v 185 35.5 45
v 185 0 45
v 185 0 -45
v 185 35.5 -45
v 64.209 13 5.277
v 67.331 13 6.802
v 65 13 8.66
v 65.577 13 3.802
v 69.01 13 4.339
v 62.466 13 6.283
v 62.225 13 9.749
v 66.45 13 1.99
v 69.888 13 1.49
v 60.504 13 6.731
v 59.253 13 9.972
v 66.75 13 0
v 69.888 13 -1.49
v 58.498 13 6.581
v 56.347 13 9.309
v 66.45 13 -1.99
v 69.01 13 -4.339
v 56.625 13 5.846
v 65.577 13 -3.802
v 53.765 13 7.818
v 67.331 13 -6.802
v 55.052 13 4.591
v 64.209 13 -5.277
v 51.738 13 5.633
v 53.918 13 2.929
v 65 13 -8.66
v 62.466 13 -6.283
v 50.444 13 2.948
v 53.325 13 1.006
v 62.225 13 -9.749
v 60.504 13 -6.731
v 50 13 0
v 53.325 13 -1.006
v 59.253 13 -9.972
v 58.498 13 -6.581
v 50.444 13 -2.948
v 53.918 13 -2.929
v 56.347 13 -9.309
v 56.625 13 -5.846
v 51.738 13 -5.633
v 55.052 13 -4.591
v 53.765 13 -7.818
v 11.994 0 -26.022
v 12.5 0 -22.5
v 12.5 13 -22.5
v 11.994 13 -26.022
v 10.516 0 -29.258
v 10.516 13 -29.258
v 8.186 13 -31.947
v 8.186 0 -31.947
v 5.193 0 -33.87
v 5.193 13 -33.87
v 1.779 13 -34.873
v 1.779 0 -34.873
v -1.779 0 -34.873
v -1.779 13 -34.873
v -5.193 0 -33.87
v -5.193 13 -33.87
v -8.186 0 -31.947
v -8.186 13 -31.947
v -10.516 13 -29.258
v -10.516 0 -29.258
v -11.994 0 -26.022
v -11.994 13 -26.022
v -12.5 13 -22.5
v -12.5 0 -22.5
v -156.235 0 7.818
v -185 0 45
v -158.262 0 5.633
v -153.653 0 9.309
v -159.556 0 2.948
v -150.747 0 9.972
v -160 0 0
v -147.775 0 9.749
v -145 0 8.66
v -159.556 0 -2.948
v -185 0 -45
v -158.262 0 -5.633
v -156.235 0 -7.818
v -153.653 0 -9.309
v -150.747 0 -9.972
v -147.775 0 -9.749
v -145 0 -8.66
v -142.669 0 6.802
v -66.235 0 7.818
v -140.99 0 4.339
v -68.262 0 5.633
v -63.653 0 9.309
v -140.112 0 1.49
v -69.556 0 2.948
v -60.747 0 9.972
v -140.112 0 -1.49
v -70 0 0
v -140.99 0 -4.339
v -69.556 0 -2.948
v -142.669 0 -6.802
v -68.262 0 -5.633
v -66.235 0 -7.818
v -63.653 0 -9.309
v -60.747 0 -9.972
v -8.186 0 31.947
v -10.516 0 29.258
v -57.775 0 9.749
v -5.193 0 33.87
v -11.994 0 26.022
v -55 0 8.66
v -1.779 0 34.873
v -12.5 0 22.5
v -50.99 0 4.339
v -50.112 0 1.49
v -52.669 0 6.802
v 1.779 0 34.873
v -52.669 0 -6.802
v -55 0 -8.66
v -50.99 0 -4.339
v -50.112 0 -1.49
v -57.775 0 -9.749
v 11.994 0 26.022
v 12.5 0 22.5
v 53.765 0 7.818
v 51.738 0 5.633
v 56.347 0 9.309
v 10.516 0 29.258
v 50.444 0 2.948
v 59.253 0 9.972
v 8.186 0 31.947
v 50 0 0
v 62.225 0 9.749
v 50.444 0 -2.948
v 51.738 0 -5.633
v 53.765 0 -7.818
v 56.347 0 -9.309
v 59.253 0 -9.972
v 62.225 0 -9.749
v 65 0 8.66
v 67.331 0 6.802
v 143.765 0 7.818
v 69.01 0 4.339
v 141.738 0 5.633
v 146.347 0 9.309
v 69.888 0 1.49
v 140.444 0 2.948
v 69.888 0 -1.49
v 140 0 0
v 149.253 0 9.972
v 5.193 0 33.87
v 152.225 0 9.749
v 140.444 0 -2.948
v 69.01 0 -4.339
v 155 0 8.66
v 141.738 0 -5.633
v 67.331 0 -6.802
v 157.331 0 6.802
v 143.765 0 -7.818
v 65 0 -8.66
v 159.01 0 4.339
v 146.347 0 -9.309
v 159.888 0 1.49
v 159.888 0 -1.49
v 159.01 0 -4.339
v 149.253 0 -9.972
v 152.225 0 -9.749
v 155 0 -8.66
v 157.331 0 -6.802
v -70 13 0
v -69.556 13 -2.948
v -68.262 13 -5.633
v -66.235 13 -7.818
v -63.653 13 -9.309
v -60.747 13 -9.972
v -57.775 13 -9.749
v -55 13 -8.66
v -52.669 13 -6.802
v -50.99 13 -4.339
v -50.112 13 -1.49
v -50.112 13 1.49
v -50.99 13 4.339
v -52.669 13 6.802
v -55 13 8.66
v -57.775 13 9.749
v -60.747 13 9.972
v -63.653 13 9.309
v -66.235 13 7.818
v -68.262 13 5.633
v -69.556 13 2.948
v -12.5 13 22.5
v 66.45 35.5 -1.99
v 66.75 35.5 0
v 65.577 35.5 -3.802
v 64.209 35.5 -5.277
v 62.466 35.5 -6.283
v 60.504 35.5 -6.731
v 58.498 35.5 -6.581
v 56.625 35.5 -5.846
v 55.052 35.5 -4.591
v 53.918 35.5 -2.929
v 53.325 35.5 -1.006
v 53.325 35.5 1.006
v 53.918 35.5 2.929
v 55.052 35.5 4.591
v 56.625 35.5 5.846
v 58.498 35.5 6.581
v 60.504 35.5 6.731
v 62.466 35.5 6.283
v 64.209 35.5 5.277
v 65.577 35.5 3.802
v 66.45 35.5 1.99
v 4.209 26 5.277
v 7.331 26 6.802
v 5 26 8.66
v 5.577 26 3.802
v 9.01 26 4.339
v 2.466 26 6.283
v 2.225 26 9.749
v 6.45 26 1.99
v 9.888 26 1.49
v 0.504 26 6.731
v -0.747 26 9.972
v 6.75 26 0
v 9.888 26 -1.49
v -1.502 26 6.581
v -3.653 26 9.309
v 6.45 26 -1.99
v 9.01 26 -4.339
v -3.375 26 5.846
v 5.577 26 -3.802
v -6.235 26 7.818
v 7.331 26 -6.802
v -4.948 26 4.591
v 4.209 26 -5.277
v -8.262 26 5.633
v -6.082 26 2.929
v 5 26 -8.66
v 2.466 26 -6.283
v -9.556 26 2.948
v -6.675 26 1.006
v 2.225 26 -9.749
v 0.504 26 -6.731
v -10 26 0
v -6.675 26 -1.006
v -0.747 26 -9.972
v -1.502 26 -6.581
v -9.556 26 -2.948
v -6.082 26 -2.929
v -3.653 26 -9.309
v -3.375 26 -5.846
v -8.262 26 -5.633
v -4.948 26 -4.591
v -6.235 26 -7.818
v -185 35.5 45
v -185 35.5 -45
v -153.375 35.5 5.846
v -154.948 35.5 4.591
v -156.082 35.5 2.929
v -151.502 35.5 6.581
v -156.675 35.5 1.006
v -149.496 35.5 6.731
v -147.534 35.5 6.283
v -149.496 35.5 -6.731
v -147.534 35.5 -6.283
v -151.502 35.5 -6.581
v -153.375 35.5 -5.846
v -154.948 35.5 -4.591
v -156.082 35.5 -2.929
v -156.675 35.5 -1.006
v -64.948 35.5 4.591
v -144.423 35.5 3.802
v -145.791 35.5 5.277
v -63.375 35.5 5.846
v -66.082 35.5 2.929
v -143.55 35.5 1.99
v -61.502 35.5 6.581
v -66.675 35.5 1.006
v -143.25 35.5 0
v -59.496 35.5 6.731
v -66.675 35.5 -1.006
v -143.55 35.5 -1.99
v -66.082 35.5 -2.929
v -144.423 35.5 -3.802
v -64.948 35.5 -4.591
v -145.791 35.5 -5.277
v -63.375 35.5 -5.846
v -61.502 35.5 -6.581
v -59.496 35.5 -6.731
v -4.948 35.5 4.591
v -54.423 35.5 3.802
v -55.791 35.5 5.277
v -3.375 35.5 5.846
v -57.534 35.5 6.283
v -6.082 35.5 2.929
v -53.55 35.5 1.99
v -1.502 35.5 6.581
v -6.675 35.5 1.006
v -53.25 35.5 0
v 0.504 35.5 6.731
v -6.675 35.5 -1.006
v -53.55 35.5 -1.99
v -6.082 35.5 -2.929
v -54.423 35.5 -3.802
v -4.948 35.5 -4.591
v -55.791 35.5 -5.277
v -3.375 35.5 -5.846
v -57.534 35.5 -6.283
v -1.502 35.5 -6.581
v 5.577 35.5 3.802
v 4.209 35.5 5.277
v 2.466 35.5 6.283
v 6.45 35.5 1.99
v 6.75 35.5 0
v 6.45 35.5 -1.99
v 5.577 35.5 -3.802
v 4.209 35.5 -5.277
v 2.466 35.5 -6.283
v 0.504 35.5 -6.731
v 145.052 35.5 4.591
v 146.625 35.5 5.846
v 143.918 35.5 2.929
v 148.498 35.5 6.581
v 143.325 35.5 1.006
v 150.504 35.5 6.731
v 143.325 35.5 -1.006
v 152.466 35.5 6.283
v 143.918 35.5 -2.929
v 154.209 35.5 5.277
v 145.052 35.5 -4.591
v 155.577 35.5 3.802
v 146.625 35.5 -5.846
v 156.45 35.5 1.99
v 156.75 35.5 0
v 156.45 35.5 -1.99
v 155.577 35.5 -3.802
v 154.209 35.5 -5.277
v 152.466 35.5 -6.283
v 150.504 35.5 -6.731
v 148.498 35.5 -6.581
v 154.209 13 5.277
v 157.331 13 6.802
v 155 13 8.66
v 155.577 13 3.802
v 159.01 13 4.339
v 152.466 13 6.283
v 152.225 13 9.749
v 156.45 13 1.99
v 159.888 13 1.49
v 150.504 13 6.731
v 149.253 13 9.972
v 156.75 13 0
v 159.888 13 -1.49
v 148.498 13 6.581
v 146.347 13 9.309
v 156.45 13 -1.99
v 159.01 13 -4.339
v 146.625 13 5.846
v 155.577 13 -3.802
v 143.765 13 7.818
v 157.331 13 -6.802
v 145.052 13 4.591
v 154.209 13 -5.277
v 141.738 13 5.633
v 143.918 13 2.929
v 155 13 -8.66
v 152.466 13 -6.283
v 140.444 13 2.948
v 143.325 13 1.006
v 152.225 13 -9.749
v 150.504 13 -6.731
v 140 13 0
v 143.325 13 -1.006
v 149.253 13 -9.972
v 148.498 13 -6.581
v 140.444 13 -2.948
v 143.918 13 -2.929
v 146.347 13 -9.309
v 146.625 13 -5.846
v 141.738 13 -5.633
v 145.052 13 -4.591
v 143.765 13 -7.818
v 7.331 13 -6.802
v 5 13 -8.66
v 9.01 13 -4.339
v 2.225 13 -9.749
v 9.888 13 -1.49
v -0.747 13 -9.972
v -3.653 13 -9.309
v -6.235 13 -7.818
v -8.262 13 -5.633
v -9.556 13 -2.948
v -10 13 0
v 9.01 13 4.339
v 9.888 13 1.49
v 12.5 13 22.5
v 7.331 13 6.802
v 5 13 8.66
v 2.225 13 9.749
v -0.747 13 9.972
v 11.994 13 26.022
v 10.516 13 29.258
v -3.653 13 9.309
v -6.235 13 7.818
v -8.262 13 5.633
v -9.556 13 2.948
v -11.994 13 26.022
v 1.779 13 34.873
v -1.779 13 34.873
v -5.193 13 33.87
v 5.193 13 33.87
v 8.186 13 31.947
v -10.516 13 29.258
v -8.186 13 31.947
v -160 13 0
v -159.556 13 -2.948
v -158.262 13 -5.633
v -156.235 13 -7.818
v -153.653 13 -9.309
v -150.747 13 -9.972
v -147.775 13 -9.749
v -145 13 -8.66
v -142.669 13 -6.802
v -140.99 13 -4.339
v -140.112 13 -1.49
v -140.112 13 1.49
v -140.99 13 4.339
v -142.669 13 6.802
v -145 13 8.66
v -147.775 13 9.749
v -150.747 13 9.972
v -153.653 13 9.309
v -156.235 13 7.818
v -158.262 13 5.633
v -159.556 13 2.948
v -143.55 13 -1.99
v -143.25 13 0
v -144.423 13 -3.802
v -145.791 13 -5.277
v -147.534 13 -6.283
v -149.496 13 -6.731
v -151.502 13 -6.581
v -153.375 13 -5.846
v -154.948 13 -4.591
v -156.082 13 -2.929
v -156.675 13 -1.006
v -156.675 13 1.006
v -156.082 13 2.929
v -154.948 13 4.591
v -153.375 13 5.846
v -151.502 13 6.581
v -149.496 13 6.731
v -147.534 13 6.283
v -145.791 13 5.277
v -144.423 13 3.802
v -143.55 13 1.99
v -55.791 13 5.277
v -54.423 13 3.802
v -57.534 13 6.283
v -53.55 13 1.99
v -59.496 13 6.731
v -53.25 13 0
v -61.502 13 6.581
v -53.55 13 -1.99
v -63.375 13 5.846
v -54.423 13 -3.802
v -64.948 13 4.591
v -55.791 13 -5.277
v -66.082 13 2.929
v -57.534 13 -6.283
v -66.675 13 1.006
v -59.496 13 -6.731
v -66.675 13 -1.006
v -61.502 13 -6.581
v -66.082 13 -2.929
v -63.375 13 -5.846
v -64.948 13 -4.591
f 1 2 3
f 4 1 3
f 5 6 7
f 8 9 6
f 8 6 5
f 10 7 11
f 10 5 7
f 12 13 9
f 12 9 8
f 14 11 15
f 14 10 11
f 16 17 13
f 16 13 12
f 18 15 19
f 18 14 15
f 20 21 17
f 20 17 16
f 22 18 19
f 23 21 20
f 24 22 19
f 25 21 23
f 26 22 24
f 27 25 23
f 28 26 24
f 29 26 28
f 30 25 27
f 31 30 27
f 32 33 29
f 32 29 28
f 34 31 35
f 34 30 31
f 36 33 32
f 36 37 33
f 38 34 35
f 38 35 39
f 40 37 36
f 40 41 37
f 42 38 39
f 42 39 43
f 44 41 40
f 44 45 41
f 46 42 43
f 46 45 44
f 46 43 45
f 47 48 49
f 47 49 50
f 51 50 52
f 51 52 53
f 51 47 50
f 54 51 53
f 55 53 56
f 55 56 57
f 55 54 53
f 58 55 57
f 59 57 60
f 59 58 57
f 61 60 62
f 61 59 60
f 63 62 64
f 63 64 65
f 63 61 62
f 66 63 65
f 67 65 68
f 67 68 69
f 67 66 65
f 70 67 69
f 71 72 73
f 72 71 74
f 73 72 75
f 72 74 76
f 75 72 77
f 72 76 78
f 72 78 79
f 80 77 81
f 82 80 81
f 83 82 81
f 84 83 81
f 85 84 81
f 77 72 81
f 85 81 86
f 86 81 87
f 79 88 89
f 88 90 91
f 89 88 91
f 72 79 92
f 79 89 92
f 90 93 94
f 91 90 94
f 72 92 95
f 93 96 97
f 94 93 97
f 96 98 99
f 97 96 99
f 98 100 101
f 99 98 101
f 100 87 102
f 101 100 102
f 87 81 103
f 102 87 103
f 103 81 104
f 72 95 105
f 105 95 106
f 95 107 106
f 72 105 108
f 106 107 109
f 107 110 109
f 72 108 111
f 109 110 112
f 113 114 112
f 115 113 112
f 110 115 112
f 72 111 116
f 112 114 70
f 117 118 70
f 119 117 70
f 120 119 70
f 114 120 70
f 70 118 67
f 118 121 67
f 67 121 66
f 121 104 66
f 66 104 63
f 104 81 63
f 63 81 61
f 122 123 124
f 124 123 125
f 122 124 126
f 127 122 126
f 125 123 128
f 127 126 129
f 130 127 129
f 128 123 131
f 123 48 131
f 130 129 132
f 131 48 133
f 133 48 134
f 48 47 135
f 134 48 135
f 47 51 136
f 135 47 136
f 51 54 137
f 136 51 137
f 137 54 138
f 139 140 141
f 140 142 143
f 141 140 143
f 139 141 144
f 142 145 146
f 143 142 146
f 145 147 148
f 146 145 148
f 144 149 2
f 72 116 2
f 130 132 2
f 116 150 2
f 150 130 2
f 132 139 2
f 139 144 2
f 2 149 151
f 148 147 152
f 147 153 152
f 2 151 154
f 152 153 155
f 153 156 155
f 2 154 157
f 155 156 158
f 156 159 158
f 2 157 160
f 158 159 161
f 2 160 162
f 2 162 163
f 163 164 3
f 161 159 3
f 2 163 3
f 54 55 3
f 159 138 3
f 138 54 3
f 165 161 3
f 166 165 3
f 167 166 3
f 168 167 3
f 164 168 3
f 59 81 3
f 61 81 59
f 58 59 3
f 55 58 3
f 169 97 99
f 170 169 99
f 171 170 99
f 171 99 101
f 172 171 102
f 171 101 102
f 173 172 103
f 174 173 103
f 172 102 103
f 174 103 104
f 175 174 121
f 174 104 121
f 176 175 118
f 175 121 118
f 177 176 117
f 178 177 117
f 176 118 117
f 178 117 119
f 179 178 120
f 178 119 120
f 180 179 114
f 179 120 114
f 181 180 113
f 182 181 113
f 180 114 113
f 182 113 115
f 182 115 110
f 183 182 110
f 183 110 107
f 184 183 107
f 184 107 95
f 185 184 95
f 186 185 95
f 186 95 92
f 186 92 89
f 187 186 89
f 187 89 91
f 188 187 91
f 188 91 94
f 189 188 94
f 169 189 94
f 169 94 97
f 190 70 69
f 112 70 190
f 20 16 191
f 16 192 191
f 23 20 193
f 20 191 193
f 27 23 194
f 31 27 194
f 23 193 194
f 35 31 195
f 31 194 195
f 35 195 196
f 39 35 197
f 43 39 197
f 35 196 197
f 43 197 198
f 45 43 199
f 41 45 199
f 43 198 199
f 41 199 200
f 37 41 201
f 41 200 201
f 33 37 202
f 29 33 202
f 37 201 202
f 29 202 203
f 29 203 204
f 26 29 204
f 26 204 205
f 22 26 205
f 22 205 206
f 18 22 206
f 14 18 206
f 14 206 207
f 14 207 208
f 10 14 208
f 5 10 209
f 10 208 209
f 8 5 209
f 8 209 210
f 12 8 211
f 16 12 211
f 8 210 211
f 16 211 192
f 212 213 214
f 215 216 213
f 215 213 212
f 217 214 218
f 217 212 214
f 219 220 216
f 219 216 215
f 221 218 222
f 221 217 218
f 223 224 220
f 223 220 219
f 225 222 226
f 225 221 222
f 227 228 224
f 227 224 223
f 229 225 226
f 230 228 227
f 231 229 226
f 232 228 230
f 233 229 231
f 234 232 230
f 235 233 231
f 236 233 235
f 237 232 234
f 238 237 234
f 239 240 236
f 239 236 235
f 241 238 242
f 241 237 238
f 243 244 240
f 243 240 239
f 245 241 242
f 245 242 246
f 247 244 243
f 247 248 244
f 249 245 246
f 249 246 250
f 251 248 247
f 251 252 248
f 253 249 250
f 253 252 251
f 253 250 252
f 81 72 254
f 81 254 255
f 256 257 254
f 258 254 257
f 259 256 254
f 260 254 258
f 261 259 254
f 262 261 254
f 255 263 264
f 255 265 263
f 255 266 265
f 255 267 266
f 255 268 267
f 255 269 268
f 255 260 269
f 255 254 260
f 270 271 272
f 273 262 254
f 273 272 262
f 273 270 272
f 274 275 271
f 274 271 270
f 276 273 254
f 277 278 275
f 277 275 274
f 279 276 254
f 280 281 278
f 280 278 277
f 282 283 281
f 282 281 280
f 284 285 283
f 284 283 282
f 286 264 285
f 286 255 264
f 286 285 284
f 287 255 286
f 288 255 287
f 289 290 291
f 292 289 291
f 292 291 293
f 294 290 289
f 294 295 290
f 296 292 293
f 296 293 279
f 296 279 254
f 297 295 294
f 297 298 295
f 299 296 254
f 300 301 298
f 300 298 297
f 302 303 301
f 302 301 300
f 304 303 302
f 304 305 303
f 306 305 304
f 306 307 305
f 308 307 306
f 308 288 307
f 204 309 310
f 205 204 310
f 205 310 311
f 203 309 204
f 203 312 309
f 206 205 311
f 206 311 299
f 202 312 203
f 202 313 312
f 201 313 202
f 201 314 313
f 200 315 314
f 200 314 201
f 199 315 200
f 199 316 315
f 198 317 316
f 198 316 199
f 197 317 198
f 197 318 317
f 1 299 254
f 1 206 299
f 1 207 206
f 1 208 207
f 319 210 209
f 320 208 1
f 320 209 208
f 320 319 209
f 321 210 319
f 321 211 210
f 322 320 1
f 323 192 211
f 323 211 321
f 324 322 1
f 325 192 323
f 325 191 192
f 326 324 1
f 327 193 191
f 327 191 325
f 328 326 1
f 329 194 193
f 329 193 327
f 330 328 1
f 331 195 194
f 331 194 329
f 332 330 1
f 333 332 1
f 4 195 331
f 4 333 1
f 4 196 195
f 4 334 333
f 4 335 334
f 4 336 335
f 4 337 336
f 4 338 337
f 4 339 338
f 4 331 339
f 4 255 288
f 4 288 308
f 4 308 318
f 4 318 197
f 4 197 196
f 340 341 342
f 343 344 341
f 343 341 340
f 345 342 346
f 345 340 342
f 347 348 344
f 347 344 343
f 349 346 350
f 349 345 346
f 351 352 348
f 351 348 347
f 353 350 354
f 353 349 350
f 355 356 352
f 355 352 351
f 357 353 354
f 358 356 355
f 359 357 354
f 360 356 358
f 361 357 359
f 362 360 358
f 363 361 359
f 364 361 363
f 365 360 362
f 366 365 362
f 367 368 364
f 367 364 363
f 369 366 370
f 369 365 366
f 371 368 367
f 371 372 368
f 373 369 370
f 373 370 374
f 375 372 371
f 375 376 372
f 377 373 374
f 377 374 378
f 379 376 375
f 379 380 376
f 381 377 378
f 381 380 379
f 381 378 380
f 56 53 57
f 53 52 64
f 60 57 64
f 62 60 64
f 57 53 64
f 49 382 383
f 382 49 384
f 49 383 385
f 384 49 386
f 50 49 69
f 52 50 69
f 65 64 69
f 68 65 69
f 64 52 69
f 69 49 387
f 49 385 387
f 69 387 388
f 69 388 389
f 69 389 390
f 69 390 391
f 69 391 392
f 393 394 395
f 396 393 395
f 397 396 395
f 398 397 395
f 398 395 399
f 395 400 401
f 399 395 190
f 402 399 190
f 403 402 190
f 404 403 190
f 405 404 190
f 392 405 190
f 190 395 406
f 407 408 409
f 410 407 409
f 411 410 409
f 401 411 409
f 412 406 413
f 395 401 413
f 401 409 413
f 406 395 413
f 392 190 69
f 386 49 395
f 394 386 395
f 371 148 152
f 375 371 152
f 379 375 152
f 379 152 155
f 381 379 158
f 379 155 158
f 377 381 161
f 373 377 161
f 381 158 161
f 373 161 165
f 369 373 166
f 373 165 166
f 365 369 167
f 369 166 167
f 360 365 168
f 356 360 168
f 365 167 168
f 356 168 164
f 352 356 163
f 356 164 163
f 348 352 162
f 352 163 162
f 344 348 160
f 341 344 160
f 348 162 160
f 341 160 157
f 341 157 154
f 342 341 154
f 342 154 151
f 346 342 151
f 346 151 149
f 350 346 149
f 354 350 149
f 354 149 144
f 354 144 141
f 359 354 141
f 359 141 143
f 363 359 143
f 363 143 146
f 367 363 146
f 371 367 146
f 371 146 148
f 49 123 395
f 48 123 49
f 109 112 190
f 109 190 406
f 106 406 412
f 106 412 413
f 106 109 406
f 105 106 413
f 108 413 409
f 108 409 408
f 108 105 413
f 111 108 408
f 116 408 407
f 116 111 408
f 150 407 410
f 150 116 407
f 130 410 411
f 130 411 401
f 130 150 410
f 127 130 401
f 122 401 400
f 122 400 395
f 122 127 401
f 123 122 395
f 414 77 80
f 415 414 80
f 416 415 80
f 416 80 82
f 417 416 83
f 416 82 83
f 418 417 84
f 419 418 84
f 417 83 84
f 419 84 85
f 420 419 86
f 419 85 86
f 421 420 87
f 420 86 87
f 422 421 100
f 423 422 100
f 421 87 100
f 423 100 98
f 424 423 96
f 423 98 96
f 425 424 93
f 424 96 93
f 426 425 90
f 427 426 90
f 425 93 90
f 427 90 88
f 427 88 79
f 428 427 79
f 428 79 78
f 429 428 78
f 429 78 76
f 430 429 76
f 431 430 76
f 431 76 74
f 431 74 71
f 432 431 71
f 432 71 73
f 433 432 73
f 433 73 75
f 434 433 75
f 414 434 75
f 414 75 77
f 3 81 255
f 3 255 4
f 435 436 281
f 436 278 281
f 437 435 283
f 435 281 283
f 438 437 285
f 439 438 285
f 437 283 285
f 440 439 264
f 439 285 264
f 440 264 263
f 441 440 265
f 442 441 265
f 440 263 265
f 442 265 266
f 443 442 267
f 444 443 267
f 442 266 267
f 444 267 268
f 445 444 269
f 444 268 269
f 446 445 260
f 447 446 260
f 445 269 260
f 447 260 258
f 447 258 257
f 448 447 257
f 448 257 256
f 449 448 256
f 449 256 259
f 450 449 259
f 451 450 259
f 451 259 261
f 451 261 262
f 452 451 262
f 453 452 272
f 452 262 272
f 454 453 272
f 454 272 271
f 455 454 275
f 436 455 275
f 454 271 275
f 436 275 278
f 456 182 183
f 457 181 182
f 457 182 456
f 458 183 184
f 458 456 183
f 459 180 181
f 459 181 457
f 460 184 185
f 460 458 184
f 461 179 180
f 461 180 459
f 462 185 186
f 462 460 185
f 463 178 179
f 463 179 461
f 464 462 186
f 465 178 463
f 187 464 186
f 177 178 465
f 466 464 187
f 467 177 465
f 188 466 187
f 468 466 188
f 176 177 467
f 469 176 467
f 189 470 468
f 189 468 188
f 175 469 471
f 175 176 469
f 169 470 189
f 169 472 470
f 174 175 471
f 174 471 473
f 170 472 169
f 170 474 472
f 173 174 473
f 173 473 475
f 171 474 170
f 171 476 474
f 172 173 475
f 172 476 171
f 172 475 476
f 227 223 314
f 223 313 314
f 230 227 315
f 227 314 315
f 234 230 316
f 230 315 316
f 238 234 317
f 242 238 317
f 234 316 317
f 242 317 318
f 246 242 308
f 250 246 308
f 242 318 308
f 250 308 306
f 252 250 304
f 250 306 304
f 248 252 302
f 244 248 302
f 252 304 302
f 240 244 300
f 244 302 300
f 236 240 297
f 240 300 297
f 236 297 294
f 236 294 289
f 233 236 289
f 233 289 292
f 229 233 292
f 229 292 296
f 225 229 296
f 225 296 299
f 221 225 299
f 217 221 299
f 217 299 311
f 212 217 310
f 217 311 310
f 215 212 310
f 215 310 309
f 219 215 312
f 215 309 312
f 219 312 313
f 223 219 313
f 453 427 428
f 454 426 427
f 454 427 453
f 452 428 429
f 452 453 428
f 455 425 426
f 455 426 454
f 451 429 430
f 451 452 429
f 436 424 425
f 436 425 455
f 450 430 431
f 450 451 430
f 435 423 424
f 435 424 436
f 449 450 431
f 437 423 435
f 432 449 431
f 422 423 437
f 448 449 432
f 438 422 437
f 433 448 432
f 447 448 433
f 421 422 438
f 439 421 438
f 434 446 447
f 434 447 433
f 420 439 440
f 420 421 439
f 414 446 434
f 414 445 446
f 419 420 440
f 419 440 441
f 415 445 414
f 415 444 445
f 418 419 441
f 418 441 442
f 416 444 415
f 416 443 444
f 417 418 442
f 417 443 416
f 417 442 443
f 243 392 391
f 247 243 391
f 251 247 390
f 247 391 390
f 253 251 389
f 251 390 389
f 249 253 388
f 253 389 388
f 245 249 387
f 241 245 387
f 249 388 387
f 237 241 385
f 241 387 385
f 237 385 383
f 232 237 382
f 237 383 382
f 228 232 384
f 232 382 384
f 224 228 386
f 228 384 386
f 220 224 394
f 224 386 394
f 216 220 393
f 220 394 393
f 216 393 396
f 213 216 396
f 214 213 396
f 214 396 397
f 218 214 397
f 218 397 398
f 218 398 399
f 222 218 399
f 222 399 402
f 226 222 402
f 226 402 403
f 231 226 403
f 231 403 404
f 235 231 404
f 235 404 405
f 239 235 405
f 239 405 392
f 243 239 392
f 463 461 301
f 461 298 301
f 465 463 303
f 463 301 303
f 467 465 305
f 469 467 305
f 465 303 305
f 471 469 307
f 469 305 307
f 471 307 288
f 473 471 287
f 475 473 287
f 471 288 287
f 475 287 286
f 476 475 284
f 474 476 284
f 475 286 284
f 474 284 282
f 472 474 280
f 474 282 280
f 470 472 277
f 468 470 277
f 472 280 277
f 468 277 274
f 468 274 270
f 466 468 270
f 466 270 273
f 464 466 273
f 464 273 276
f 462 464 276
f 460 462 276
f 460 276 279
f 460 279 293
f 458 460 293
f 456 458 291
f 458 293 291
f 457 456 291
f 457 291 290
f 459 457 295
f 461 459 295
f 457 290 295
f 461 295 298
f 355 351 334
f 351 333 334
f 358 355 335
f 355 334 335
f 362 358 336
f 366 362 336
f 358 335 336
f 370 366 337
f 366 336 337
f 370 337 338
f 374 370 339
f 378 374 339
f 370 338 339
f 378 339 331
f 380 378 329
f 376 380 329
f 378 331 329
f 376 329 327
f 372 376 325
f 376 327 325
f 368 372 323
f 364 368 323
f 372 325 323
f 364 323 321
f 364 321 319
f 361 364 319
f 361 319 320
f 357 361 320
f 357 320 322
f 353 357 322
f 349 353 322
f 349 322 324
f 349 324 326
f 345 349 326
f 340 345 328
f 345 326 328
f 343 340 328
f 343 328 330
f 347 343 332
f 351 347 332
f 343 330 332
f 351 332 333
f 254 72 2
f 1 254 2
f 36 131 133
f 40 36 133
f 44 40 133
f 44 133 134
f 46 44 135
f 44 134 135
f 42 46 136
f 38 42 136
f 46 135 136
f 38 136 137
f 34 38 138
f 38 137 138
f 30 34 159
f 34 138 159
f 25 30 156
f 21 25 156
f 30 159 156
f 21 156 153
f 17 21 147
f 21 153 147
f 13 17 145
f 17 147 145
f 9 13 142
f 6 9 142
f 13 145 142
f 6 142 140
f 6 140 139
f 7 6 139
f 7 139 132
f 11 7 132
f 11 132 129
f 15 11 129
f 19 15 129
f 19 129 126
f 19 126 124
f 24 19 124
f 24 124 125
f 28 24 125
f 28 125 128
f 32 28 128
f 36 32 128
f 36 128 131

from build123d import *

# Parameters (mm, degrees)
SKETCH_3_W                    = 370
SKETCH_3_H                    = 90
EXTRUDE_2_DEPTH               = 35.5
HOLE_WIZARD_M12_1_D           = 13.5
HOLE_WIZARD_M12_1_CBORE_D     = 20
HOLE_WIZARD_M12_1_CBORE_DEPTH = 13
CUT_EXTRUDE_1_DEPTH           = 13
HOLE_WIZARD_M12_2_D           = 13.5
HOLE_WIZARD_M12_2_CBORE_D     = 20
HOLE_WIZARD_M12_2_CBORE_DEPTH = 13


with BuildPart() as part:
    # 草图3 → 凸台-拉伸2 (new body)
    with BuildSketch(Plane(origin=(0, 0, 0), x_dir=(1, 0, 0), z_dir=(0, 1, 0))):
        Rectangle(SKETCH_3_W, SKETCH_3_H)
    extrude(amount=EXTRUDE_2_DEPTH)

    # M12 六角头螺栓的柱形沉头孔1 (through all)
    with Locations(Plane(origin=(0, 0, 0), x_dir=(-1, 0, 0), z_dir=(0, -1, 0))):
        with Locations((-150, 0), (-60, 0), (60, 0), (150, 0)):
            CounterBoreHole(HOLE_WIZARD_M12_1_D / 2, HOLE_WIZARD_M12_1_CBORE_D / 2, HOLE_WIZARD_M12_1_CBORE_DEPTH)

    # 草图7 → 切除-拉伸1 (cut)
    with BuildSketch(Plane.XZ):
        with BuildLine():
            Line((-12.5, -22.5), (-12.5, 22.5))
            ThreePointArc((-12.5, 22.5), (0, 35), (12.5, 22.5))
            Line((12.5, 22.5), (12.5, -22.5))
            ThreePointArc((12.5, -22.5), (0, -35), (-12.5, -22.5))
        make_face()
    extrude(amount=-CUT_EXTRUDE_1_DEPTH, mode=Mode.SUBTRACT)

    # M12 六角头螺栓的柱形沉头孔2 (through all)
    with Locations(Plane(origin=(0, 13, 0), x_dir=(-1, 0, 0), z_dir=(0, -1, 0))):
        with Locations((0, 0)):
            CounterBoreHole(HOLE_WIZARD_M12_2_D / 2, HOLE_WIZARD_M12_2_CBORE_D / 2, HOLE_WIZARD_M12_2_CBORE_DEPTH)


solid = part.part
